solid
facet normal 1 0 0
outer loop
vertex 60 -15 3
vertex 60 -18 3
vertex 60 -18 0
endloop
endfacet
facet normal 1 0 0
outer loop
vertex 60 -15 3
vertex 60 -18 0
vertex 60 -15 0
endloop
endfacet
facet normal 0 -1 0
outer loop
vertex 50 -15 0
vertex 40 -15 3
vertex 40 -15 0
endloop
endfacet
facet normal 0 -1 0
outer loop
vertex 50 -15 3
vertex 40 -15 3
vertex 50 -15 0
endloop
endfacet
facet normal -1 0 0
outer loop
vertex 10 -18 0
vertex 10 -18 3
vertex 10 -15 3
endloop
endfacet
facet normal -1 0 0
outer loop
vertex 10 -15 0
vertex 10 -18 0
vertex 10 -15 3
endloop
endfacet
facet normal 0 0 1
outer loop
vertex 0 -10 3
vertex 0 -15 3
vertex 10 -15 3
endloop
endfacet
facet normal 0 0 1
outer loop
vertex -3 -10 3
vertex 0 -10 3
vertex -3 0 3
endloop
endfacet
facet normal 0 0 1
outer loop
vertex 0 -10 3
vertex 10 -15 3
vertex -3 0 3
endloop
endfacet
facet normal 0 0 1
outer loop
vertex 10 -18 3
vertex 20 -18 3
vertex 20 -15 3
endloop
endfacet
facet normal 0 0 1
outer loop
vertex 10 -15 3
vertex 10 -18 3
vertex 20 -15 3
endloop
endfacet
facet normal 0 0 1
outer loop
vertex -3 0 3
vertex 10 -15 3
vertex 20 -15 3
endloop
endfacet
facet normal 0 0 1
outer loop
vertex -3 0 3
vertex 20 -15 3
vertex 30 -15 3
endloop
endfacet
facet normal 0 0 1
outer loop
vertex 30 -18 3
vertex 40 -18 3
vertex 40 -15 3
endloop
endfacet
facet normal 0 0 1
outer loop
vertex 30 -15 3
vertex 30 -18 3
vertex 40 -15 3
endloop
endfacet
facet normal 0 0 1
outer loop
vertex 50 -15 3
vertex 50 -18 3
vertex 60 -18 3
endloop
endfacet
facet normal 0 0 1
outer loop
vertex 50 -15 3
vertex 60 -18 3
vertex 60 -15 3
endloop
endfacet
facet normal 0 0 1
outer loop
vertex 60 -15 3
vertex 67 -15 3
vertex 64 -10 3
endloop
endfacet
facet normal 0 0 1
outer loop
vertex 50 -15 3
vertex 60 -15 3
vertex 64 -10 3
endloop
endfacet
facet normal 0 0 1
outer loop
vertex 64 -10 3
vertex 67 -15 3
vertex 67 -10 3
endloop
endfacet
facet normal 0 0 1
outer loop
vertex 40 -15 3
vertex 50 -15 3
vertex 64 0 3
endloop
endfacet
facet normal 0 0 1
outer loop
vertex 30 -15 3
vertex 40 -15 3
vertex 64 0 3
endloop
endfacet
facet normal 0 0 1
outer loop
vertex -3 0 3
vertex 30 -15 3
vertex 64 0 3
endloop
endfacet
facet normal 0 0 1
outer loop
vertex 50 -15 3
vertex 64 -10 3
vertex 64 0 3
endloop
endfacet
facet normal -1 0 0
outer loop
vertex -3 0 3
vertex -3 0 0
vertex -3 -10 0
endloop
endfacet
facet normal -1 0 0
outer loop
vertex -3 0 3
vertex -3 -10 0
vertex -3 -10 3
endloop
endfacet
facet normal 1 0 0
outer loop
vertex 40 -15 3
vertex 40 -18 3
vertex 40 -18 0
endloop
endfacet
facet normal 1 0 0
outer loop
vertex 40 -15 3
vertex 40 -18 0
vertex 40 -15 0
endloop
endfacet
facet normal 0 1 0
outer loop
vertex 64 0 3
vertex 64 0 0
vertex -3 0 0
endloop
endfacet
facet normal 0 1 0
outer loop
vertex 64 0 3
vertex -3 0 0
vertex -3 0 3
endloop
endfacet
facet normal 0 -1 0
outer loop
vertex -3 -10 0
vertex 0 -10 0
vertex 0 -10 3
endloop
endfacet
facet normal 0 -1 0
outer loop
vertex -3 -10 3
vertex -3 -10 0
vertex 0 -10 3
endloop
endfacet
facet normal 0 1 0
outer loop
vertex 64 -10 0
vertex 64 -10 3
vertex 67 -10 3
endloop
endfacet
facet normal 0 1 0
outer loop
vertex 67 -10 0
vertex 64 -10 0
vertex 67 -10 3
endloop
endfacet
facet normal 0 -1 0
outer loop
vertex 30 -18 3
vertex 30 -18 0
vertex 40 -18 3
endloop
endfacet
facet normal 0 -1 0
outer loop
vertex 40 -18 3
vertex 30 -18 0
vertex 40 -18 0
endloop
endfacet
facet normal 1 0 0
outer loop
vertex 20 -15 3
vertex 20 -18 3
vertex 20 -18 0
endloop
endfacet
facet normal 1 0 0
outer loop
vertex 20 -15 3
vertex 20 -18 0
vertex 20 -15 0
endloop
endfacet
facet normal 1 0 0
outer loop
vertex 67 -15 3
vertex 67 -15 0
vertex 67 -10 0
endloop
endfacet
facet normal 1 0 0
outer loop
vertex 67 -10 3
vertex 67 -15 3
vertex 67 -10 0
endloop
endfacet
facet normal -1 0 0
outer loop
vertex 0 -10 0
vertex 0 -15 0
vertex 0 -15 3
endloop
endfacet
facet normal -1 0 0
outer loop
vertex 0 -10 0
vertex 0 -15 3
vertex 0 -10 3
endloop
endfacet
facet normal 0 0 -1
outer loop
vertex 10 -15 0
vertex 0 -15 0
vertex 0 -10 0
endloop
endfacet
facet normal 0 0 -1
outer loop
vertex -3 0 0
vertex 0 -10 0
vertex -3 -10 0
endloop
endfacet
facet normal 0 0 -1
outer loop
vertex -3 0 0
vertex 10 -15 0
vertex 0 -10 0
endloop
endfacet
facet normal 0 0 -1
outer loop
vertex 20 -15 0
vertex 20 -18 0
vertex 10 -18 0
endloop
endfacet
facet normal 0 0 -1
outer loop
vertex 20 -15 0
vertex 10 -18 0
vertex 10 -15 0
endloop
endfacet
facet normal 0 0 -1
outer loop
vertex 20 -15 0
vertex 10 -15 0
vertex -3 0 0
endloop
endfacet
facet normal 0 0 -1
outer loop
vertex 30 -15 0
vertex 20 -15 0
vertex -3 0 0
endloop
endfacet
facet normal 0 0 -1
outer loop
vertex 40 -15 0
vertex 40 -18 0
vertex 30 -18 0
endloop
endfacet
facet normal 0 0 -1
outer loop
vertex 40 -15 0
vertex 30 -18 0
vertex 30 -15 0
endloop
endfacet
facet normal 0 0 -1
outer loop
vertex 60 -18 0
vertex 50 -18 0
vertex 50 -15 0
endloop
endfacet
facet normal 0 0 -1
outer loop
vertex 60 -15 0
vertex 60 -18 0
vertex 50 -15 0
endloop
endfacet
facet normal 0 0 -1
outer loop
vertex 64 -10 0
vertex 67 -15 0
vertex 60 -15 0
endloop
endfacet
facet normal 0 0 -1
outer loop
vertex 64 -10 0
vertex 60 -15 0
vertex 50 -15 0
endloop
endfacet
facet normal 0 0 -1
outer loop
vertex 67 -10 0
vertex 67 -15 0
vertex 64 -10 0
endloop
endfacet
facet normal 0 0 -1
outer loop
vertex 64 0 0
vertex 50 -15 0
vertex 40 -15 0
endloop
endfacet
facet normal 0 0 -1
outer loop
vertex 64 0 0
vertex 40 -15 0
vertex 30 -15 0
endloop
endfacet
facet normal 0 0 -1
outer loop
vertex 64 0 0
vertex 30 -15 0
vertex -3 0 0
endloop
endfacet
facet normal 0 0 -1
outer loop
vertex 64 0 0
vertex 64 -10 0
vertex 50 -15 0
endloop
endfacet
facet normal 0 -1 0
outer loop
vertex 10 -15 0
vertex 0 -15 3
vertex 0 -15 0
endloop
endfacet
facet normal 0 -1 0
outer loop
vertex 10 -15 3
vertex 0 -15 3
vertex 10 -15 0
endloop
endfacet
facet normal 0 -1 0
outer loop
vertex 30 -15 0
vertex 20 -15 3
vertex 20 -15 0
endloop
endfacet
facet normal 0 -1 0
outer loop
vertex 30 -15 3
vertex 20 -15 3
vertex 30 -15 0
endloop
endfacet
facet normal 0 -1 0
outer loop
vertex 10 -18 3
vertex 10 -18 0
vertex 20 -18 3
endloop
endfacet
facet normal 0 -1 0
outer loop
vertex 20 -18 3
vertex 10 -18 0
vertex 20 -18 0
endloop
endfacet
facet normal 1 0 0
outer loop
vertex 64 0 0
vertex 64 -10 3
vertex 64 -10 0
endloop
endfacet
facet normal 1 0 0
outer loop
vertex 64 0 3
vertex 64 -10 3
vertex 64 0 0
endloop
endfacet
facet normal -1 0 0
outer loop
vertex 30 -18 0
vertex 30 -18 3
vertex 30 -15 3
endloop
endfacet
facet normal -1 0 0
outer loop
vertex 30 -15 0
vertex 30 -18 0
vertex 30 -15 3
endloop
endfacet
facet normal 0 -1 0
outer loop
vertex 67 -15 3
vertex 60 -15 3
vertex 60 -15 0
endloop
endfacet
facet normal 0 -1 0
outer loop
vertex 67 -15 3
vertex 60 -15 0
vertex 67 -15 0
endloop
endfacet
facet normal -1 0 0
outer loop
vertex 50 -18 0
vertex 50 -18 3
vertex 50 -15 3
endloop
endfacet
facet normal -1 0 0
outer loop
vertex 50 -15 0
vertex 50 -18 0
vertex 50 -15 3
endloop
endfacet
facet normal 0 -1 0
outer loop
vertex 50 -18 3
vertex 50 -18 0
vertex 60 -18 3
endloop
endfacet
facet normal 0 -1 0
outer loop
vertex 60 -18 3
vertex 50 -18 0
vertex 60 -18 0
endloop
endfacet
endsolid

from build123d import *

# Parameters (mm, degrees)
ESQUISSE1_W                = 67
ESQUISSE1_H                = 18
BOSS_EXTRU_1_DEPTH         = 3
ESQUISSE2_W                = 10
ESQUISSE2_H                = 3
ENL_V_MAT_EXTRU_1_DEPTH    = 10
R_P_TITION_LIN_AIRE1_COUNT = 4
R_P_TITION_LIN_AIRE1_PITCH = 20
ESQUISSE3_W                = 3
ESQUISSE3_H                = 10
ENL_V_MAT_EXTRU_2_DEPTH    = 10
ESQUISSE4_W                = 3
ESQUISSE4_H                = 10
BOSS_EXTRU_2_DEPTH         = 3


with BuildPart() as part:
    # Esquisse1 → Boss.-Extru.1 (new body)
    with BuildSketch(Plane.XY):
        with Locations((33.5, -9)):
            Rectangle(ESQUISSE1_W, ESQUISSE1_H)
    extrude(amount=BOSS_EXTRU_1_DEPTH)

    # Esquisse2 → Enlèv. mat.-Extru.1 (cut)
    with BuildSketch(Plane.XY.offset(3)):
        with Locations((5, -16.5)):
            Rectangle(ESQUISSE2_W, ESQUISSE2_H)
    enl_v_mat_extru_1 = extrude(amount=-ENL_V_MAT_EXTRU_1_DEPTH, mode=Mode.SUBTRACT)

    # Répétition linéaire1: Enlèv. mat.-Extru.1 ×4
    with Locations(*[(i * R_P_TITION_LIN_AIRE1_PITCH, 0, 0) for i in range(1, R_P_TITION_LIN_AIRE1_COUNT)]):
        add(enl_v_mat_extru_1, mode=Mode.SUBTRACT)

    # Esquisse3 → Enlèv. mat.-Extru.2 (cut)
    with BuildSketch(Plane.XY.offset(3)):
        with Locations((65.5, -5)):
            Rectangle(ESQUISSE3_W, ESQUISSE3_H)
    extrude(amount=-ENL_V_MAT_EXTRU_2_DEPTH, mode=Mode.SUBTRACT)

    # Esquisse4 → Boss.-Extru.2 (add)
    with BuildSketch(Plane.ZY):
        with Locations((1.5, -5)):
            Rectangle(ESQUISSE4_W, ESQUISSE4_H)
    extrude(amount=BOSS_EXTRU_2_DEPTH)


solid = part.part
